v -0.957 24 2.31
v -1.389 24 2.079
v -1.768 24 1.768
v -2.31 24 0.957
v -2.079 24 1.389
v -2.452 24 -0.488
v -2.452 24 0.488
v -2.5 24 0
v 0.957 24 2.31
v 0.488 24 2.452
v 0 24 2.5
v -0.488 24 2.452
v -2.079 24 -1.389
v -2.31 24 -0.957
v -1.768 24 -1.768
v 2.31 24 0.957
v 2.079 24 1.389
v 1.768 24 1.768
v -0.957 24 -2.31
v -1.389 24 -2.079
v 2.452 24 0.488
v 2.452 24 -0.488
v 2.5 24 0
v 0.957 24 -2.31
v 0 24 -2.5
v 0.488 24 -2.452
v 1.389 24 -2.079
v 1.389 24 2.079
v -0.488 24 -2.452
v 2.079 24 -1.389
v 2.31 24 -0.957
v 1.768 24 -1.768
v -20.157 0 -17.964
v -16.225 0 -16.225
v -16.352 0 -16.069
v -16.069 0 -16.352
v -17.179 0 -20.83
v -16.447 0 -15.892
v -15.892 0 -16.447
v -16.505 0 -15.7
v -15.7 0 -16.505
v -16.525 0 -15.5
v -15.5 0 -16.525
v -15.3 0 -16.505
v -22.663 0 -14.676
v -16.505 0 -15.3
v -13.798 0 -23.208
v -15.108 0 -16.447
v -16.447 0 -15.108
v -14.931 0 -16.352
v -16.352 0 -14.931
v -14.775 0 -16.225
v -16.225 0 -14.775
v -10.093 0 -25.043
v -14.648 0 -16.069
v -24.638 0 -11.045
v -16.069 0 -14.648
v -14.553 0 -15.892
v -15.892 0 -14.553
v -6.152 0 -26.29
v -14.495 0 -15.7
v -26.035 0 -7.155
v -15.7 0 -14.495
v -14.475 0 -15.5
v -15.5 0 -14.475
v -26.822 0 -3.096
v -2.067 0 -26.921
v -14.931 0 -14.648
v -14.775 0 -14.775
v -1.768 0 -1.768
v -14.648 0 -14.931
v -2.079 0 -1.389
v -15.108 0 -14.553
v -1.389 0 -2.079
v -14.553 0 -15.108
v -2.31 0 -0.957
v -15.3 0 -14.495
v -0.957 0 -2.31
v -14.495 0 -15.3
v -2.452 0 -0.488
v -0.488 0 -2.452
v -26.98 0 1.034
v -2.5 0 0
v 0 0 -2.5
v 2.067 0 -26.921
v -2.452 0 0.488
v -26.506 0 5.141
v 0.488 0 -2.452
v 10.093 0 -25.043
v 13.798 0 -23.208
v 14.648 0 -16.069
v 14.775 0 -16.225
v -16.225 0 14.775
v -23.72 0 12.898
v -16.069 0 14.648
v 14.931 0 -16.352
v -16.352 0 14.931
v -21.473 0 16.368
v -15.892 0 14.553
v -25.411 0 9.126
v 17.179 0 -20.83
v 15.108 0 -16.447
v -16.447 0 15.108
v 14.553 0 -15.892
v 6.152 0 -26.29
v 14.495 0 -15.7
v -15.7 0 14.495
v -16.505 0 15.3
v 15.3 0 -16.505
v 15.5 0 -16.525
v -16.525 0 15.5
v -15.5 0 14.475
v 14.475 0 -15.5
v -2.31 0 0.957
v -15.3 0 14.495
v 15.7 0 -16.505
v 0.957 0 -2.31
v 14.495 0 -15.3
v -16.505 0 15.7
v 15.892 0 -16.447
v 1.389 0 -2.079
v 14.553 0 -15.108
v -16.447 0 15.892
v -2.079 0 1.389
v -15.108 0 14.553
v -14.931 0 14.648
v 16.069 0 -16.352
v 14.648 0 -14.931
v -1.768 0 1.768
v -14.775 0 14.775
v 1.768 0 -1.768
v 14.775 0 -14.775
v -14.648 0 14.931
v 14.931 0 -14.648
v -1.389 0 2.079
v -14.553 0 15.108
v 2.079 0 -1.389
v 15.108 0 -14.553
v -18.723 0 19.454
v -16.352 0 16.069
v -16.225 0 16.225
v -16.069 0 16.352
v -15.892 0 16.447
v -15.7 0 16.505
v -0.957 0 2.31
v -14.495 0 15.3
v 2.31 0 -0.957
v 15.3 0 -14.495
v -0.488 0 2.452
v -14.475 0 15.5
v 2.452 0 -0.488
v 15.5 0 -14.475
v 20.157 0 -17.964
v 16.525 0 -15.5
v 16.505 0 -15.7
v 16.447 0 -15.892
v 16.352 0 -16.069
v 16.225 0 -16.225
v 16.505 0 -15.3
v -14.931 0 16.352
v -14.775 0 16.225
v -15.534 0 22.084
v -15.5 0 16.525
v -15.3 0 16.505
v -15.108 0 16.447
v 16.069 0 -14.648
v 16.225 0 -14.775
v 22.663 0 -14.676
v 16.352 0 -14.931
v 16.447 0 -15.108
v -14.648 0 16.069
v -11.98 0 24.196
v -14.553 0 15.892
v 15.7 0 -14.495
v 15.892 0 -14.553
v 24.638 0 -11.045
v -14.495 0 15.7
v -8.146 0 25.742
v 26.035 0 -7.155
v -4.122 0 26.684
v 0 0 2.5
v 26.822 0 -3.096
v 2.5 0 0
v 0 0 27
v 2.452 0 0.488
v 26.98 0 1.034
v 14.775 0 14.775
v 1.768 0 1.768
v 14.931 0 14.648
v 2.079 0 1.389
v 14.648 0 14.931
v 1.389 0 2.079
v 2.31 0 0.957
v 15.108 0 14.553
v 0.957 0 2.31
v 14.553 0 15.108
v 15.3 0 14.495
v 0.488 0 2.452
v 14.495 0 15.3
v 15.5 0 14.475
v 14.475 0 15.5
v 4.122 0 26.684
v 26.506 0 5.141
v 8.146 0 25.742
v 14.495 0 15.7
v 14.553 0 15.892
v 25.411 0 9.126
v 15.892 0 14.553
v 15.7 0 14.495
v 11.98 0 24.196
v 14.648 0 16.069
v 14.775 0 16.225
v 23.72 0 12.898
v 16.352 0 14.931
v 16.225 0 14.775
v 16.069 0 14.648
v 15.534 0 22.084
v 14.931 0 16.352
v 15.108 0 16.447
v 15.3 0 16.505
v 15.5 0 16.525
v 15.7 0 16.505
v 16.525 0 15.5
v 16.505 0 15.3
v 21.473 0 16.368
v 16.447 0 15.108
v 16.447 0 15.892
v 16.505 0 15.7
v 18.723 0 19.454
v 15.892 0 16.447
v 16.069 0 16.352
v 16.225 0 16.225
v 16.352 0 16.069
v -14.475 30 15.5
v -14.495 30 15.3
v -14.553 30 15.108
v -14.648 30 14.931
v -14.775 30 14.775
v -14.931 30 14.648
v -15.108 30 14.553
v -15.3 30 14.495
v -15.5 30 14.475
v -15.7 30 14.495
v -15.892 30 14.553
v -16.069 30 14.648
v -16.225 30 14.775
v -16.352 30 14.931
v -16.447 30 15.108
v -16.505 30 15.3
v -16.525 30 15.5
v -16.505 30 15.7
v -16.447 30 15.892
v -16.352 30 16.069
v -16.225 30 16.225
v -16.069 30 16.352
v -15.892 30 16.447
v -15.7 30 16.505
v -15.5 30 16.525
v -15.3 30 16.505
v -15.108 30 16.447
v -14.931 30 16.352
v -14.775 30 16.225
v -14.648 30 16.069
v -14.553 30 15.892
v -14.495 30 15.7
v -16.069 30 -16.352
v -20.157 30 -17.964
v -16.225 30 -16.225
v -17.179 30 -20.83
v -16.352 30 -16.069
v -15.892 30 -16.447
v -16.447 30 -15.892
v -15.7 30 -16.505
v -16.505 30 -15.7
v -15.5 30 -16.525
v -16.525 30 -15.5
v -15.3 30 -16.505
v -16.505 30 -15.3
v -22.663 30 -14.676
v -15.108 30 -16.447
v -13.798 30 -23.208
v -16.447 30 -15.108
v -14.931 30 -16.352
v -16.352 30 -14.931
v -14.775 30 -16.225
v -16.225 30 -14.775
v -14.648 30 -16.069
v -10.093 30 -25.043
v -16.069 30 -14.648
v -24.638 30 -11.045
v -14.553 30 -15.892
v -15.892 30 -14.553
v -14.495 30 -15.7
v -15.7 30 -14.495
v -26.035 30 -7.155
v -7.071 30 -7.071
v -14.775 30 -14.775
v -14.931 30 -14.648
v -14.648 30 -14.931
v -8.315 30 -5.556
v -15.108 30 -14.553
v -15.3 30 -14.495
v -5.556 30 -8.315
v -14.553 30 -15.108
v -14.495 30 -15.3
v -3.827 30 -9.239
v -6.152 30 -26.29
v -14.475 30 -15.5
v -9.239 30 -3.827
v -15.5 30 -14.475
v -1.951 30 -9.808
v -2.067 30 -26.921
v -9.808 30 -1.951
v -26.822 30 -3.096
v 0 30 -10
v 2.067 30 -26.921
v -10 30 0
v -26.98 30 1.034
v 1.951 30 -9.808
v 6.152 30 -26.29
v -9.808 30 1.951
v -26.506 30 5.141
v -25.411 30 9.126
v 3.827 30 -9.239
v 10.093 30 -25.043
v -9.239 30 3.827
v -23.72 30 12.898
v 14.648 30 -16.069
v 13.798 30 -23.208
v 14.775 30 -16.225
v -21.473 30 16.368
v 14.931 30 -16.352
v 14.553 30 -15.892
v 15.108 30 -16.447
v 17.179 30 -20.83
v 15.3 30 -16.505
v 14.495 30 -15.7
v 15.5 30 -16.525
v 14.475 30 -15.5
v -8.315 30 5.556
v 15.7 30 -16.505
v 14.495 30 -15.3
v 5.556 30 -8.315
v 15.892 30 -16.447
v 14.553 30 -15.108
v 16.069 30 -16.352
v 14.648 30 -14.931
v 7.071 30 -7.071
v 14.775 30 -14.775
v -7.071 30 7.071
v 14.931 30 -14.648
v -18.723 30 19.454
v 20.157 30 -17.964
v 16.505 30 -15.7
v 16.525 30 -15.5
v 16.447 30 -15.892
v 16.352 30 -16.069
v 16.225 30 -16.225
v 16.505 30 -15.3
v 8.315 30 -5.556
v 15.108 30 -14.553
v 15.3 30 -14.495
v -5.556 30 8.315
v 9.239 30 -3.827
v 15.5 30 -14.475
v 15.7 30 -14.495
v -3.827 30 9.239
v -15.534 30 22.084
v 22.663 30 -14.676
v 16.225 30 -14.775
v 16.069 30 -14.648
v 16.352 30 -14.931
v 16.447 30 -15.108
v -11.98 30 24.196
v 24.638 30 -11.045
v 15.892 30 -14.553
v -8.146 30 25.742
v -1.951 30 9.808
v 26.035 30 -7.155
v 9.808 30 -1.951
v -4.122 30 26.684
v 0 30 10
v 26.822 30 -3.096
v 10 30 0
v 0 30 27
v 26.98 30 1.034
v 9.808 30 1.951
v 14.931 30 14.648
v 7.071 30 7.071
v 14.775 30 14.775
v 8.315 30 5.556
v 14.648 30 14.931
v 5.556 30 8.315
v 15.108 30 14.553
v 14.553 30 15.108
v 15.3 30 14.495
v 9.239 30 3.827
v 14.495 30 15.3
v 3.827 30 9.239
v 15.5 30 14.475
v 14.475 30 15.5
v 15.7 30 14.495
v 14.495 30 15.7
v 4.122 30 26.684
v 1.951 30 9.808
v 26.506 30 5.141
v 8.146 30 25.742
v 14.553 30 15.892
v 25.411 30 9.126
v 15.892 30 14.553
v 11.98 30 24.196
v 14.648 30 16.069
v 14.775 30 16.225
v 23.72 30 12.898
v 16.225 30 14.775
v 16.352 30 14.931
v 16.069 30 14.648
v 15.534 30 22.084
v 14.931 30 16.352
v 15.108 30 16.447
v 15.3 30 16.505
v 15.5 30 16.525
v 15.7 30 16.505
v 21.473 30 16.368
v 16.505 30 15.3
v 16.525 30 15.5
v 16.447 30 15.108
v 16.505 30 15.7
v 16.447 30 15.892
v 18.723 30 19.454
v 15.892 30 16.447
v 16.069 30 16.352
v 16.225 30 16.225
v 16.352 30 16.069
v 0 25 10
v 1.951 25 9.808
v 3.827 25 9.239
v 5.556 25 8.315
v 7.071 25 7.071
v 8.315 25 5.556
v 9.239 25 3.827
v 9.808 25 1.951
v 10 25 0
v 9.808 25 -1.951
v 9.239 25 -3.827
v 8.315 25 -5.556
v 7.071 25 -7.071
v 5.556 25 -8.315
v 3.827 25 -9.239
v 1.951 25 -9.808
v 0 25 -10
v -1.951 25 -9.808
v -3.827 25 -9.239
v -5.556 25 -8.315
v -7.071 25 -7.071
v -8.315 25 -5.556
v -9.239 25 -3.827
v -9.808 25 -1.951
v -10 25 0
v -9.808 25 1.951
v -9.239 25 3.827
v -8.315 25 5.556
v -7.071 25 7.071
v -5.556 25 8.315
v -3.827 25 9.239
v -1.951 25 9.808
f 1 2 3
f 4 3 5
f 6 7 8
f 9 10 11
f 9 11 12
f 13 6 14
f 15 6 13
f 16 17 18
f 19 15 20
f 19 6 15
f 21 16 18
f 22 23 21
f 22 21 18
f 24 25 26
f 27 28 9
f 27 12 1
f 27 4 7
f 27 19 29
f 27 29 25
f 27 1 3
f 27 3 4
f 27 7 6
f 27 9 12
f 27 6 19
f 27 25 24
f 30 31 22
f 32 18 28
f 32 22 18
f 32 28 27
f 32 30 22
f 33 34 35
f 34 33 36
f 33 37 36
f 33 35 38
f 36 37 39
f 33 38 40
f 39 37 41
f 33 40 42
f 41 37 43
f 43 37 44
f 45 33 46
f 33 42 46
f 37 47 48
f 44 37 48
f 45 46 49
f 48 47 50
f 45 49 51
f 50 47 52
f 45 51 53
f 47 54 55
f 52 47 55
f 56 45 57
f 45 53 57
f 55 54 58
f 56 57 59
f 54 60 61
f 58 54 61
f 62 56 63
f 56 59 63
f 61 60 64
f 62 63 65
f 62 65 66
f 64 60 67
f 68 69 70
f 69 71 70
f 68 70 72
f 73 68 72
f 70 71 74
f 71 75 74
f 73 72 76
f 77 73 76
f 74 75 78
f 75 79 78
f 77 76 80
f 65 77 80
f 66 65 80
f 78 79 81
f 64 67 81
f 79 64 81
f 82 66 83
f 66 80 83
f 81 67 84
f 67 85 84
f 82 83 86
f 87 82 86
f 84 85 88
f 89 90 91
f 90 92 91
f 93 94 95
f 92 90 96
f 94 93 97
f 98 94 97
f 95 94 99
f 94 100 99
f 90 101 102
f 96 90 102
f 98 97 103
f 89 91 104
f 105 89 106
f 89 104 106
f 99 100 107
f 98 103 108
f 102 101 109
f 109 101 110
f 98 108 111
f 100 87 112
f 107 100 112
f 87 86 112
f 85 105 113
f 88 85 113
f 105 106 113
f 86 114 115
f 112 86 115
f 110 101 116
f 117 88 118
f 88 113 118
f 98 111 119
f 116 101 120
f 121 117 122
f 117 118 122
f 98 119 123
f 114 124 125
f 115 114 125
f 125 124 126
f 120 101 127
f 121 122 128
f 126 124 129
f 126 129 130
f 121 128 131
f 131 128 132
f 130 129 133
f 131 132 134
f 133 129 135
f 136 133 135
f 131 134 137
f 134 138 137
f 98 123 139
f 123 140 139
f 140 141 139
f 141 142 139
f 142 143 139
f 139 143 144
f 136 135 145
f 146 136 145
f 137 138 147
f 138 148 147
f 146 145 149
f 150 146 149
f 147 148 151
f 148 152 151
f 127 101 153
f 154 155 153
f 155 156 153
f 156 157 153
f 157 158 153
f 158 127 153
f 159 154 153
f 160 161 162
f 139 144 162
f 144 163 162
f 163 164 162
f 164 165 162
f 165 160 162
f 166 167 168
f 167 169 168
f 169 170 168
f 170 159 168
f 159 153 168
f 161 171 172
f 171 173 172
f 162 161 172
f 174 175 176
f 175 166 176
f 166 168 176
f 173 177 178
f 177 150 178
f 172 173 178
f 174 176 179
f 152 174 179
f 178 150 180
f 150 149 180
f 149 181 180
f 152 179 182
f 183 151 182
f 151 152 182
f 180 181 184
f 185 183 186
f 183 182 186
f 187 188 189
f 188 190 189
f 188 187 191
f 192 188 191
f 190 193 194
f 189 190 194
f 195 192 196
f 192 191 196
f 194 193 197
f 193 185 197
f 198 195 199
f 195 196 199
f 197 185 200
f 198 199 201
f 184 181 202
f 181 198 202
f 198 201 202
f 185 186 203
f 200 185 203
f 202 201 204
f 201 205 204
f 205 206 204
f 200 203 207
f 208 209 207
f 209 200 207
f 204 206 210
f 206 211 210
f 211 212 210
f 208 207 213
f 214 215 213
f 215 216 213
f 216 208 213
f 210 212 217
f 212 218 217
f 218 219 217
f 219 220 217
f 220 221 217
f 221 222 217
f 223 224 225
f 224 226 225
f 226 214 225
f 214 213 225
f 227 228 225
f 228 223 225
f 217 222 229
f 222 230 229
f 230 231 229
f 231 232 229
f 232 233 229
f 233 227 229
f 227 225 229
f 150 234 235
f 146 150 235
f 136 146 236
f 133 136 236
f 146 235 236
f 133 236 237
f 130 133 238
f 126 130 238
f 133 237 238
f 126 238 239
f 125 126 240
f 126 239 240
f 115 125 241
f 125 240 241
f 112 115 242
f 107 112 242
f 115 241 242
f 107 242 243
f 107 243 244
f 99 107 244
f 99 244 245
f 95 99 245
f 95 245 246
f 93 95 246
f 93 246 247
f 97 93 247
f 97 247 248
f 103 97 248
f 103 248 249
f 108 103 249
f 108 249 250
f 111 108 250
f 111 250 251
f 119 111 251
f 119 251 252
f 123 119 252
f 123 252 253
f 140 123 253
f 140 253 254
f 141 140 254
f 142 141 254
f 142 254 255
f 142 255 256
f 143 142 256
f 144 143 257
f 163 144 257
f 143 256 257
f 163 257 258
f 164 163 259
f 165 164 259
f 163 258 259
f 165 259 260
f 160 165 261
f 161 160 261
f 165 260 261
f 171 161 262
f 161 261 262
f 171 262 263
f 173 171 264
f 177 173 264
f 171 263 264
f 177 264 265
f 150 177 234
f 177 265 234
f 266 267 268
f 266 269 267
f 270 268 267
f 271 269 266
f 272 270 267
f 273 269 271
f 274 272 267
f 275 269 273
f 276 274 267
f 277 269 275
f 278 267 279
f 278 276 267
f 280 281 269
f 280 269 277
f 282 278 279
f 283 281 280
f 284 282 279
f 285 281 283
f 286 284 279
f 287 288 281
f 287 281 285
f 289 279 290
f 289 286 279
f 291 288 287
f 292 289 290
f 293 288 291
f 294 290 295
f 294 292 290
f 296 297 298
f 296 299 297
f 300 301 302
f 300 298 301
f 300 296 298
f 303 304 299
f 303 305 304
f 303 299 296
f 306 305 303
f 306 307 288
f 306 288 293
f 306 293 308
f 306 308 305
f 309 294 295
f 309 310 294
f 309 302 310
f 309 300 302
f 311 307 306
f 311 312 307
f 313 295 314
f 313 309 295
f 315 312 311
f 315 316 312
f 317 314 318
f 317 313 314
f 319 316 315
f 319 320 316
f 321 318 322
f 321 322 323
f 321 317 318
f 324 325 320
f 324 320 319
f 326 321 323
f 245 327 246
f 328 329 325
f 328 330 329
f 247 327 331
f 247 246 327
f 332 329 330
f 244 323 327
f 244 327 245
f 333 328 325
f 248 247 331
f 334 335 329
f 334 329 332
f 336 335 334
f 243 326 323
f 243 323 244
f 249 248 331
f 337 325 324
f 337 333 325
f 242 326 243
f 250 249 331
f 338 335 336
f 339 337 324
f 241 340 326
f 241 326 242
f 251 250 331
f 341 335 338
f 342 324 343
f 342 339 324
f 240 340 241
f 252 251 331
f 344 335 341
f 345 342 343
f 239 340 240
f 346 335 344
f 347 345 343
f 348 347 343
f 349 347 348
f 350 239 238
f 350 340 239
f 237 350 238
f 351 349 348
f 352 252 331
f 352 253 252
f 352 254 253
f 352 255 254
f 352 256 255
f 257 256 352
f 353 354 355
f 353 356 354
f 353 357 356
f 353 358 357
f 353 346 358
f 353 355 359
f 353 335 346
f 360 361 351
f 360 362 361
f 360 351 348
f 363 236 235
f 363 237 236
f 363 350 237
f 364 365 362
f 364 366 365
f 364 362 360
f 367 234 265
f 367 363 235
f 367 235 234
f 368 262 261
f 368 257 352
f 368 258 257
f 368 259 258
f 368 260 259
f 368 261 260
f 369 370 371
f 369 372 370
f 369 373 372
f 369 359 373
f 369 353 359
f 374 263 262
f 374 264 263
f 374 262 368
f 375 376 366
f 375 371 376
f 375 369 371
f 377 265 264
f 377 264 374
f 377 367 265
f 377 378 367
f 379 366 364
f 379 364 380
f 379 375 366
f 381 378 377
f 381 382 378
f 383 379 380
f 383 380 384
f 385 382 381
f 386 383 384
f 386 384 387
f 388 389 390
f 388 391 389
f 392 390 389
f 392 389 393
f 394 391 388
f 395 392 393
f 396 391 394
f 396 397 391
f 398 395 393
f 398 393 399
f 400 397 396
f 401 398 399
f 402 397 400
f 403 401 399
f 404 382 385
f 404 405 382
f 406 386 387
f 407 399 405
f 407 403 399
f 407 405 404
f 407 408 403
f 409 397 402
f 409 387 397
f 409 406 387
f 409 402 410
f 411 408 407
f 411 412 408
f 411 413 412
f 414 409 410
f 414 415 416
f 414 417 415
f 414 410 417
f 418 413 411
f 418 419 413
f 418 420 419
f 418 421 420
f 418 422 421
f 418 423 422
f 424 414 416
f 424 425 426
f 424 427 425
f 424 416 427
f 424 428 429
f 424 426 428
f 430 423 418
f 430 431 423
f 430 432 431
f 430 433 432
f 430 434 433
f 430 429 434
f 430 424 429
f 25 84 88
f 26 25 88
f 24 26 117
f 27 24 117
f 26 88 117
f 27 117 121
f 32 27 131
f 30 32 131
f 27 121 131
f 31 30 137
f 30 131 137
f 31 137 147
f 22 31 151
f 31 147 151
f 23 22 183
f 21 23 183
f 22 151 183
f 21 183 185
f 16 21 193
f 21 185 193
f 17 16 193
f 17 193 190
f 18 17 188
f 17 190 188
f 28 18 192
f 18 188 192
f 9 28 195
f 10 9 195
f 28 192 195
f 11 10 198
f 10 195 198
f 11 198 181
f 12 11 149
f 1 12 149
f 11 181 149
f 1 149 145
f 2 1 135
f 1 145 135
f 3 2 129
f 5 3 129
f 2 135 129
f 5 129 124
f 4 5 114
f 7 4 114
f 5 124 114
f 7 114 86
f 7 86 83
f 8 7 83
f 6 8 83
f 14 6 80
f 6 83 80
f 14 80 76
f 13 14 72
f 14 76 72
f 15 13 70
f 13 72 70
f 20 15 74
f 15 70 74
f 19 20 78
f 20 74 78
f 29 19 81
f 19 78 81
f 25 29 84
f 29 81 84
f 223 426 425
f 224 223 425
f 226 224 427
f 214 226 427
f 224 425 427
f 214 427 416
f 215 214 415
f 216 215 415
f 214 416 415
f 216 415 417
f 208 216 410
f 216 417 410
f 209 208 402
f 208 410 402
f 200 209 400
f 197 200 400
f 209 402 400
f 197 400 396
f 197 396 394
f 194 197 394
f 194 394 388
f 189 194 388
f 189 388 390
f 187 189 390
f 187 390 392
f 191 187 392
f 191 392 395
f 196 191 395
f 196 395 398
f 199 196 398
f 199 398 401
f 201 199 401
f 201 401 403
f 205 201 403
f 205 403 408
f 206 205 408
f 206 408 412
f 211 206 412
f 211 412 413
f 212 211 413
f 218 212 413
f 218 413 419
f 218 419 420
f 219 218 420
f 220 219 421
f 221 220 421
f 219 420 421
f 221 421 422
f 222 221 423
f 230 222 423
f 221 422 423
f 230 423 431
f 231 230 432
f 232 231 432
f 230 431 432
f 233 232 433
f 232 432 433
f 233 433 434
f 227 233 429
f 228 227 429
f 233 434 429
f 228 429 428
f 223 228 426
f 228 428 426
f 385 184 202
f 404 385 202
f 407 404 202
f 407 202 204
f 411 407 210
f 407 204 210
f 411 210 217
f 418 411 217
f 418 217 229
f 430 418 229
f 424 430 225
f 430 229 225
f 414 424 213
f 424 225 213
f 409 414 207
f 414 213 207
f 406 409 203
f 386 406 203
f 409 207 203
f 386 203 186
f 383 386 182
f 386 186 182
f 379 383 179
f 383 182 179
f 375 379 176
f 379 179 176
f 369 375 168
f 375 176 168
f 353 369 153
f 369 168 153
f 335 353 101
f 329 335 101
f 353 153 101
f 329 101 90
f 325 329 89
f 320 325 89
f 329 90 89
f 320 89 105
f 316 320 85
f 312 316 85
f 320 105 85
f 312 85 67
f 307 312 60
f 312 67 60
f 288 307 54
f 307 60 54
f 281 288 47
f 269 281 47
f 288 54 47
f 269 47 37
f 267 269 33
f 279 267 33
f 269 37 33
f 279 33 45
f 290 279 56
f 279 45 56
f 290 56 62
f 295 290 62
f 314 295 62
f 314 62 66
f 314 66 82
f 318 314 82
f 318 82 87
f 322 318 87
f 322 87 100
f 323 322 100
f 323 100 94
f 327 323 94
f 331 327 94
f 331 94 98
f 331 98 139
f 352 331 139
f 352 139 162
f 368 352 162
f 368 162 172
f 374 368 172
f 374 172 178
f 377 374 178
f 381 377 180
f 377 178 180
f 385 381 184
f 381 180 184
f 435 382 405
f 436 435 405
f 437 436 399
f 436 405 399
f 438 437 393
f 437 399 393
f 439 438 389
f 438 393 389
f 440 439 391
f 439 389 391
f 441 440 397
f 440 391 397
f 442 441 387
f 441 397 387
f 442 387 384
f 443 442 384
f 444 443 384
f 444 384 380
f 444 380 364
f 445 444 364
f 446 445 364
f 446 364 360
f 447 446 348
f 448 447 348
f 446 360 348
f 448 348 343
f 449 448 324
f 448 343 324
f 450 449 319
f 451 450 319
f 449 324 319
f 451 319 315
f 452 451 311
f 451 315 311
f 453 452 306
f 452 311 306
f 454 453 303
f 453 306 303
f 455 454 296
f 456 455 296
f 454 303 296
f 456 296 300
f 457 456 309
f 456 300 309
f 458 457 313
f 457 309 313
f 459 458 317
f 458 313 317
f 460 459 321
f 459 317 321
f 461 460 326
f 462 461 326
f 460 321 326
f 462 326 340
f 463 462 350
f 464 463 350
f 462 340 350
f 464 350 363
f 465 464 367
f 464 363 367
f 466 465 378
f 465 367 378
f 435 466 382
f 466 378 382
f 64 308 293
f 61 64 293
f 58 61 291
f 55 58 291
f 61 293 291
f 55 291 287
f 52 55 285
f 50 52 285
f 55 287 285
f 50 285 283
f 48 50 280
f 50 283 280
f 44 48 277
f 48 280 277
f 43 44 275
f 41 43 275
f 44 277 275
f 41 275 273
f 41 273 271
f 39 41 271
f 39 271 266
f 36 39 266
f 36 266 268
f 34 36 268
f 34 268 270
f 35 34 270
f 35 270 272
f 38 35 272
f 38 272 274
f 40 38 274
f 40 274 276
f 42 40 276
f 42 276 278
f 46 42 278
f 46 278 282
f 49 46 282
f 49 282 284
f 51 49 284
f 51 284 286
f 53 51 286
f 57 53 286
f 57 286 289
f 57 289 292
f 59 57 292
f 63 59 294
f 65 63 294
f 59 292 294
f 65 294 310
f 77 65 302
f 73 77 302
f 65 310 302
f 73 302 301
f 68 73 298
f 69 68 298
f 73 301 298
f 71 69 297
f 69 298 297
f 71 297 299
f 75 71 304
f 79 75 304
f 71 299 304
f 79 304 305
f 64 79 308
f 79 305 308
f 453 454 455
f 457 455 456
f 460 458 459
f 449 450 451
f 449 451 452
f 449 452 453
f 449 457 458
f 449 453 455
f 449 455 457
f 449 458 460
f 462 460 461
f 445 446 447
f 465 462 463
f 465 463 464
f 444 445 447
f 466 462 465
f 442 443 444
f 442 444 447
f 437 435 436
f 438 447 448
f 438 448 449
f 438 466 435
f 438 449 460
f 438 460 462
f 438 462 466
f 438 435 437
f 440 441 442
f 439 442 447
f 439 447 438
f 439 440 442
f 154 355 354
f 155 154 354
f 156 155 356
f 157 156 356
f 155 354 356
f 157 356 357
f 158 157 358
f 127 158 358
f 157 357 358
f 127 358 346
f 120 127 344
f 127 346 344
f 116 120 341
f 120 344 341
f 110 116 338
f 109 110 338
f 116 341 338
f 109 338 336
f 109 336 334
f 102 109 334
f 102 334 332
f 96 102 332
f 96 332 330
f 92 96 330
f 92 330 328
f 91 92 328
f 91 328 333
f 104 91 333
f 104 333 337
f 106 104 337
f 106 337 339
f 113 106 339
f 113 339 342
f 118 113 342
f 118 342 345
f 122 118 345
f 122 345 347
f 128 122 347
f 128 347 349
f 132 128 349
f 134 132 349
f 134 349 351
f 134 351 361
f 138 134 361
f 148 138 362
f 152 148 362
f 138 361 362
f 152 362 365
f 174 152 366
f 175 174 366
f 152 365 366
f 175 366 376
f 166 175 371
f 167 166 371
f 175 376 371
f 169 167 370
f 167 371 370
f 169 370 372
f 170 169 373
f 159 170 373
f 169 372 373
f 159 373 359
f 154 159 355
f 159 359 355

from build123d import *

# Parameters (mm, degrees)
SKETCH_1_R           = 27
EXTRUDE_1_DEPTH      = 30
HOLE_WIZARD_M2_5_1_D = 2.05
SKETCH_7_R           = 2.5
CUT_EXTRUDE_1_DEPTH  = 24
SKETCH_8_R           = 10
CUT_EXTRUDE_2_DEPTH  = 5


with BuildPart() as part:
    # 草图1 → 凸台-拉伸1 (new body)
    with BuildSketch(Plane(origin=(0, 0, 0), x_dir=(1, 0, 0), z_dir=(0, 1, 0))):
        with Locations(Location((0, 0, 0), (0, 0, 270))):
            Circle(SKETCH_1_R)
    extrude(amount=EXTRUDE_1_DEPTH)

    # M2.5 螺纹孔1 (through all)
    with Locations(Plane(origin=(0, 0, 0), x_dir=(-1, 0, 0), z_dir=(0, -1, 0))):
        with Locations((15.5, 15.5), (-15.5, 15.5), (-15.5, -15.5), (15.5, -15.5)):
            Hole(HOLE_WIZARD_M2_5_1_D / 2)

    # 草图7 → 切除-拉伸1 (cut)
    with BuildSketch(Plane.XZ):
        with Locations(Location((0, 0, 0), (0, 0, 270))):
            Circle(SKETCH_7_R)
    extrude(amount=-CUT_EXTRUDE_1_DEPTH, mode=Mode.SUBTRACT)

    # 草图8 → 切除-拉伸2 (cut)
    with BuildSketch(Plane(origin=(0, 30, 0), x_dir=(1, 0, 0), z_dir=(0, 1, 0))):
        with Locations(Location((0, 0, 0), (0, 0, 270))):
            Circle(SKETCH_8_R)
    extrude(amount=-CUT_EXTRUDE_2_DEPTH, mode=Mode.SUBTRACT)


solid = part.part
